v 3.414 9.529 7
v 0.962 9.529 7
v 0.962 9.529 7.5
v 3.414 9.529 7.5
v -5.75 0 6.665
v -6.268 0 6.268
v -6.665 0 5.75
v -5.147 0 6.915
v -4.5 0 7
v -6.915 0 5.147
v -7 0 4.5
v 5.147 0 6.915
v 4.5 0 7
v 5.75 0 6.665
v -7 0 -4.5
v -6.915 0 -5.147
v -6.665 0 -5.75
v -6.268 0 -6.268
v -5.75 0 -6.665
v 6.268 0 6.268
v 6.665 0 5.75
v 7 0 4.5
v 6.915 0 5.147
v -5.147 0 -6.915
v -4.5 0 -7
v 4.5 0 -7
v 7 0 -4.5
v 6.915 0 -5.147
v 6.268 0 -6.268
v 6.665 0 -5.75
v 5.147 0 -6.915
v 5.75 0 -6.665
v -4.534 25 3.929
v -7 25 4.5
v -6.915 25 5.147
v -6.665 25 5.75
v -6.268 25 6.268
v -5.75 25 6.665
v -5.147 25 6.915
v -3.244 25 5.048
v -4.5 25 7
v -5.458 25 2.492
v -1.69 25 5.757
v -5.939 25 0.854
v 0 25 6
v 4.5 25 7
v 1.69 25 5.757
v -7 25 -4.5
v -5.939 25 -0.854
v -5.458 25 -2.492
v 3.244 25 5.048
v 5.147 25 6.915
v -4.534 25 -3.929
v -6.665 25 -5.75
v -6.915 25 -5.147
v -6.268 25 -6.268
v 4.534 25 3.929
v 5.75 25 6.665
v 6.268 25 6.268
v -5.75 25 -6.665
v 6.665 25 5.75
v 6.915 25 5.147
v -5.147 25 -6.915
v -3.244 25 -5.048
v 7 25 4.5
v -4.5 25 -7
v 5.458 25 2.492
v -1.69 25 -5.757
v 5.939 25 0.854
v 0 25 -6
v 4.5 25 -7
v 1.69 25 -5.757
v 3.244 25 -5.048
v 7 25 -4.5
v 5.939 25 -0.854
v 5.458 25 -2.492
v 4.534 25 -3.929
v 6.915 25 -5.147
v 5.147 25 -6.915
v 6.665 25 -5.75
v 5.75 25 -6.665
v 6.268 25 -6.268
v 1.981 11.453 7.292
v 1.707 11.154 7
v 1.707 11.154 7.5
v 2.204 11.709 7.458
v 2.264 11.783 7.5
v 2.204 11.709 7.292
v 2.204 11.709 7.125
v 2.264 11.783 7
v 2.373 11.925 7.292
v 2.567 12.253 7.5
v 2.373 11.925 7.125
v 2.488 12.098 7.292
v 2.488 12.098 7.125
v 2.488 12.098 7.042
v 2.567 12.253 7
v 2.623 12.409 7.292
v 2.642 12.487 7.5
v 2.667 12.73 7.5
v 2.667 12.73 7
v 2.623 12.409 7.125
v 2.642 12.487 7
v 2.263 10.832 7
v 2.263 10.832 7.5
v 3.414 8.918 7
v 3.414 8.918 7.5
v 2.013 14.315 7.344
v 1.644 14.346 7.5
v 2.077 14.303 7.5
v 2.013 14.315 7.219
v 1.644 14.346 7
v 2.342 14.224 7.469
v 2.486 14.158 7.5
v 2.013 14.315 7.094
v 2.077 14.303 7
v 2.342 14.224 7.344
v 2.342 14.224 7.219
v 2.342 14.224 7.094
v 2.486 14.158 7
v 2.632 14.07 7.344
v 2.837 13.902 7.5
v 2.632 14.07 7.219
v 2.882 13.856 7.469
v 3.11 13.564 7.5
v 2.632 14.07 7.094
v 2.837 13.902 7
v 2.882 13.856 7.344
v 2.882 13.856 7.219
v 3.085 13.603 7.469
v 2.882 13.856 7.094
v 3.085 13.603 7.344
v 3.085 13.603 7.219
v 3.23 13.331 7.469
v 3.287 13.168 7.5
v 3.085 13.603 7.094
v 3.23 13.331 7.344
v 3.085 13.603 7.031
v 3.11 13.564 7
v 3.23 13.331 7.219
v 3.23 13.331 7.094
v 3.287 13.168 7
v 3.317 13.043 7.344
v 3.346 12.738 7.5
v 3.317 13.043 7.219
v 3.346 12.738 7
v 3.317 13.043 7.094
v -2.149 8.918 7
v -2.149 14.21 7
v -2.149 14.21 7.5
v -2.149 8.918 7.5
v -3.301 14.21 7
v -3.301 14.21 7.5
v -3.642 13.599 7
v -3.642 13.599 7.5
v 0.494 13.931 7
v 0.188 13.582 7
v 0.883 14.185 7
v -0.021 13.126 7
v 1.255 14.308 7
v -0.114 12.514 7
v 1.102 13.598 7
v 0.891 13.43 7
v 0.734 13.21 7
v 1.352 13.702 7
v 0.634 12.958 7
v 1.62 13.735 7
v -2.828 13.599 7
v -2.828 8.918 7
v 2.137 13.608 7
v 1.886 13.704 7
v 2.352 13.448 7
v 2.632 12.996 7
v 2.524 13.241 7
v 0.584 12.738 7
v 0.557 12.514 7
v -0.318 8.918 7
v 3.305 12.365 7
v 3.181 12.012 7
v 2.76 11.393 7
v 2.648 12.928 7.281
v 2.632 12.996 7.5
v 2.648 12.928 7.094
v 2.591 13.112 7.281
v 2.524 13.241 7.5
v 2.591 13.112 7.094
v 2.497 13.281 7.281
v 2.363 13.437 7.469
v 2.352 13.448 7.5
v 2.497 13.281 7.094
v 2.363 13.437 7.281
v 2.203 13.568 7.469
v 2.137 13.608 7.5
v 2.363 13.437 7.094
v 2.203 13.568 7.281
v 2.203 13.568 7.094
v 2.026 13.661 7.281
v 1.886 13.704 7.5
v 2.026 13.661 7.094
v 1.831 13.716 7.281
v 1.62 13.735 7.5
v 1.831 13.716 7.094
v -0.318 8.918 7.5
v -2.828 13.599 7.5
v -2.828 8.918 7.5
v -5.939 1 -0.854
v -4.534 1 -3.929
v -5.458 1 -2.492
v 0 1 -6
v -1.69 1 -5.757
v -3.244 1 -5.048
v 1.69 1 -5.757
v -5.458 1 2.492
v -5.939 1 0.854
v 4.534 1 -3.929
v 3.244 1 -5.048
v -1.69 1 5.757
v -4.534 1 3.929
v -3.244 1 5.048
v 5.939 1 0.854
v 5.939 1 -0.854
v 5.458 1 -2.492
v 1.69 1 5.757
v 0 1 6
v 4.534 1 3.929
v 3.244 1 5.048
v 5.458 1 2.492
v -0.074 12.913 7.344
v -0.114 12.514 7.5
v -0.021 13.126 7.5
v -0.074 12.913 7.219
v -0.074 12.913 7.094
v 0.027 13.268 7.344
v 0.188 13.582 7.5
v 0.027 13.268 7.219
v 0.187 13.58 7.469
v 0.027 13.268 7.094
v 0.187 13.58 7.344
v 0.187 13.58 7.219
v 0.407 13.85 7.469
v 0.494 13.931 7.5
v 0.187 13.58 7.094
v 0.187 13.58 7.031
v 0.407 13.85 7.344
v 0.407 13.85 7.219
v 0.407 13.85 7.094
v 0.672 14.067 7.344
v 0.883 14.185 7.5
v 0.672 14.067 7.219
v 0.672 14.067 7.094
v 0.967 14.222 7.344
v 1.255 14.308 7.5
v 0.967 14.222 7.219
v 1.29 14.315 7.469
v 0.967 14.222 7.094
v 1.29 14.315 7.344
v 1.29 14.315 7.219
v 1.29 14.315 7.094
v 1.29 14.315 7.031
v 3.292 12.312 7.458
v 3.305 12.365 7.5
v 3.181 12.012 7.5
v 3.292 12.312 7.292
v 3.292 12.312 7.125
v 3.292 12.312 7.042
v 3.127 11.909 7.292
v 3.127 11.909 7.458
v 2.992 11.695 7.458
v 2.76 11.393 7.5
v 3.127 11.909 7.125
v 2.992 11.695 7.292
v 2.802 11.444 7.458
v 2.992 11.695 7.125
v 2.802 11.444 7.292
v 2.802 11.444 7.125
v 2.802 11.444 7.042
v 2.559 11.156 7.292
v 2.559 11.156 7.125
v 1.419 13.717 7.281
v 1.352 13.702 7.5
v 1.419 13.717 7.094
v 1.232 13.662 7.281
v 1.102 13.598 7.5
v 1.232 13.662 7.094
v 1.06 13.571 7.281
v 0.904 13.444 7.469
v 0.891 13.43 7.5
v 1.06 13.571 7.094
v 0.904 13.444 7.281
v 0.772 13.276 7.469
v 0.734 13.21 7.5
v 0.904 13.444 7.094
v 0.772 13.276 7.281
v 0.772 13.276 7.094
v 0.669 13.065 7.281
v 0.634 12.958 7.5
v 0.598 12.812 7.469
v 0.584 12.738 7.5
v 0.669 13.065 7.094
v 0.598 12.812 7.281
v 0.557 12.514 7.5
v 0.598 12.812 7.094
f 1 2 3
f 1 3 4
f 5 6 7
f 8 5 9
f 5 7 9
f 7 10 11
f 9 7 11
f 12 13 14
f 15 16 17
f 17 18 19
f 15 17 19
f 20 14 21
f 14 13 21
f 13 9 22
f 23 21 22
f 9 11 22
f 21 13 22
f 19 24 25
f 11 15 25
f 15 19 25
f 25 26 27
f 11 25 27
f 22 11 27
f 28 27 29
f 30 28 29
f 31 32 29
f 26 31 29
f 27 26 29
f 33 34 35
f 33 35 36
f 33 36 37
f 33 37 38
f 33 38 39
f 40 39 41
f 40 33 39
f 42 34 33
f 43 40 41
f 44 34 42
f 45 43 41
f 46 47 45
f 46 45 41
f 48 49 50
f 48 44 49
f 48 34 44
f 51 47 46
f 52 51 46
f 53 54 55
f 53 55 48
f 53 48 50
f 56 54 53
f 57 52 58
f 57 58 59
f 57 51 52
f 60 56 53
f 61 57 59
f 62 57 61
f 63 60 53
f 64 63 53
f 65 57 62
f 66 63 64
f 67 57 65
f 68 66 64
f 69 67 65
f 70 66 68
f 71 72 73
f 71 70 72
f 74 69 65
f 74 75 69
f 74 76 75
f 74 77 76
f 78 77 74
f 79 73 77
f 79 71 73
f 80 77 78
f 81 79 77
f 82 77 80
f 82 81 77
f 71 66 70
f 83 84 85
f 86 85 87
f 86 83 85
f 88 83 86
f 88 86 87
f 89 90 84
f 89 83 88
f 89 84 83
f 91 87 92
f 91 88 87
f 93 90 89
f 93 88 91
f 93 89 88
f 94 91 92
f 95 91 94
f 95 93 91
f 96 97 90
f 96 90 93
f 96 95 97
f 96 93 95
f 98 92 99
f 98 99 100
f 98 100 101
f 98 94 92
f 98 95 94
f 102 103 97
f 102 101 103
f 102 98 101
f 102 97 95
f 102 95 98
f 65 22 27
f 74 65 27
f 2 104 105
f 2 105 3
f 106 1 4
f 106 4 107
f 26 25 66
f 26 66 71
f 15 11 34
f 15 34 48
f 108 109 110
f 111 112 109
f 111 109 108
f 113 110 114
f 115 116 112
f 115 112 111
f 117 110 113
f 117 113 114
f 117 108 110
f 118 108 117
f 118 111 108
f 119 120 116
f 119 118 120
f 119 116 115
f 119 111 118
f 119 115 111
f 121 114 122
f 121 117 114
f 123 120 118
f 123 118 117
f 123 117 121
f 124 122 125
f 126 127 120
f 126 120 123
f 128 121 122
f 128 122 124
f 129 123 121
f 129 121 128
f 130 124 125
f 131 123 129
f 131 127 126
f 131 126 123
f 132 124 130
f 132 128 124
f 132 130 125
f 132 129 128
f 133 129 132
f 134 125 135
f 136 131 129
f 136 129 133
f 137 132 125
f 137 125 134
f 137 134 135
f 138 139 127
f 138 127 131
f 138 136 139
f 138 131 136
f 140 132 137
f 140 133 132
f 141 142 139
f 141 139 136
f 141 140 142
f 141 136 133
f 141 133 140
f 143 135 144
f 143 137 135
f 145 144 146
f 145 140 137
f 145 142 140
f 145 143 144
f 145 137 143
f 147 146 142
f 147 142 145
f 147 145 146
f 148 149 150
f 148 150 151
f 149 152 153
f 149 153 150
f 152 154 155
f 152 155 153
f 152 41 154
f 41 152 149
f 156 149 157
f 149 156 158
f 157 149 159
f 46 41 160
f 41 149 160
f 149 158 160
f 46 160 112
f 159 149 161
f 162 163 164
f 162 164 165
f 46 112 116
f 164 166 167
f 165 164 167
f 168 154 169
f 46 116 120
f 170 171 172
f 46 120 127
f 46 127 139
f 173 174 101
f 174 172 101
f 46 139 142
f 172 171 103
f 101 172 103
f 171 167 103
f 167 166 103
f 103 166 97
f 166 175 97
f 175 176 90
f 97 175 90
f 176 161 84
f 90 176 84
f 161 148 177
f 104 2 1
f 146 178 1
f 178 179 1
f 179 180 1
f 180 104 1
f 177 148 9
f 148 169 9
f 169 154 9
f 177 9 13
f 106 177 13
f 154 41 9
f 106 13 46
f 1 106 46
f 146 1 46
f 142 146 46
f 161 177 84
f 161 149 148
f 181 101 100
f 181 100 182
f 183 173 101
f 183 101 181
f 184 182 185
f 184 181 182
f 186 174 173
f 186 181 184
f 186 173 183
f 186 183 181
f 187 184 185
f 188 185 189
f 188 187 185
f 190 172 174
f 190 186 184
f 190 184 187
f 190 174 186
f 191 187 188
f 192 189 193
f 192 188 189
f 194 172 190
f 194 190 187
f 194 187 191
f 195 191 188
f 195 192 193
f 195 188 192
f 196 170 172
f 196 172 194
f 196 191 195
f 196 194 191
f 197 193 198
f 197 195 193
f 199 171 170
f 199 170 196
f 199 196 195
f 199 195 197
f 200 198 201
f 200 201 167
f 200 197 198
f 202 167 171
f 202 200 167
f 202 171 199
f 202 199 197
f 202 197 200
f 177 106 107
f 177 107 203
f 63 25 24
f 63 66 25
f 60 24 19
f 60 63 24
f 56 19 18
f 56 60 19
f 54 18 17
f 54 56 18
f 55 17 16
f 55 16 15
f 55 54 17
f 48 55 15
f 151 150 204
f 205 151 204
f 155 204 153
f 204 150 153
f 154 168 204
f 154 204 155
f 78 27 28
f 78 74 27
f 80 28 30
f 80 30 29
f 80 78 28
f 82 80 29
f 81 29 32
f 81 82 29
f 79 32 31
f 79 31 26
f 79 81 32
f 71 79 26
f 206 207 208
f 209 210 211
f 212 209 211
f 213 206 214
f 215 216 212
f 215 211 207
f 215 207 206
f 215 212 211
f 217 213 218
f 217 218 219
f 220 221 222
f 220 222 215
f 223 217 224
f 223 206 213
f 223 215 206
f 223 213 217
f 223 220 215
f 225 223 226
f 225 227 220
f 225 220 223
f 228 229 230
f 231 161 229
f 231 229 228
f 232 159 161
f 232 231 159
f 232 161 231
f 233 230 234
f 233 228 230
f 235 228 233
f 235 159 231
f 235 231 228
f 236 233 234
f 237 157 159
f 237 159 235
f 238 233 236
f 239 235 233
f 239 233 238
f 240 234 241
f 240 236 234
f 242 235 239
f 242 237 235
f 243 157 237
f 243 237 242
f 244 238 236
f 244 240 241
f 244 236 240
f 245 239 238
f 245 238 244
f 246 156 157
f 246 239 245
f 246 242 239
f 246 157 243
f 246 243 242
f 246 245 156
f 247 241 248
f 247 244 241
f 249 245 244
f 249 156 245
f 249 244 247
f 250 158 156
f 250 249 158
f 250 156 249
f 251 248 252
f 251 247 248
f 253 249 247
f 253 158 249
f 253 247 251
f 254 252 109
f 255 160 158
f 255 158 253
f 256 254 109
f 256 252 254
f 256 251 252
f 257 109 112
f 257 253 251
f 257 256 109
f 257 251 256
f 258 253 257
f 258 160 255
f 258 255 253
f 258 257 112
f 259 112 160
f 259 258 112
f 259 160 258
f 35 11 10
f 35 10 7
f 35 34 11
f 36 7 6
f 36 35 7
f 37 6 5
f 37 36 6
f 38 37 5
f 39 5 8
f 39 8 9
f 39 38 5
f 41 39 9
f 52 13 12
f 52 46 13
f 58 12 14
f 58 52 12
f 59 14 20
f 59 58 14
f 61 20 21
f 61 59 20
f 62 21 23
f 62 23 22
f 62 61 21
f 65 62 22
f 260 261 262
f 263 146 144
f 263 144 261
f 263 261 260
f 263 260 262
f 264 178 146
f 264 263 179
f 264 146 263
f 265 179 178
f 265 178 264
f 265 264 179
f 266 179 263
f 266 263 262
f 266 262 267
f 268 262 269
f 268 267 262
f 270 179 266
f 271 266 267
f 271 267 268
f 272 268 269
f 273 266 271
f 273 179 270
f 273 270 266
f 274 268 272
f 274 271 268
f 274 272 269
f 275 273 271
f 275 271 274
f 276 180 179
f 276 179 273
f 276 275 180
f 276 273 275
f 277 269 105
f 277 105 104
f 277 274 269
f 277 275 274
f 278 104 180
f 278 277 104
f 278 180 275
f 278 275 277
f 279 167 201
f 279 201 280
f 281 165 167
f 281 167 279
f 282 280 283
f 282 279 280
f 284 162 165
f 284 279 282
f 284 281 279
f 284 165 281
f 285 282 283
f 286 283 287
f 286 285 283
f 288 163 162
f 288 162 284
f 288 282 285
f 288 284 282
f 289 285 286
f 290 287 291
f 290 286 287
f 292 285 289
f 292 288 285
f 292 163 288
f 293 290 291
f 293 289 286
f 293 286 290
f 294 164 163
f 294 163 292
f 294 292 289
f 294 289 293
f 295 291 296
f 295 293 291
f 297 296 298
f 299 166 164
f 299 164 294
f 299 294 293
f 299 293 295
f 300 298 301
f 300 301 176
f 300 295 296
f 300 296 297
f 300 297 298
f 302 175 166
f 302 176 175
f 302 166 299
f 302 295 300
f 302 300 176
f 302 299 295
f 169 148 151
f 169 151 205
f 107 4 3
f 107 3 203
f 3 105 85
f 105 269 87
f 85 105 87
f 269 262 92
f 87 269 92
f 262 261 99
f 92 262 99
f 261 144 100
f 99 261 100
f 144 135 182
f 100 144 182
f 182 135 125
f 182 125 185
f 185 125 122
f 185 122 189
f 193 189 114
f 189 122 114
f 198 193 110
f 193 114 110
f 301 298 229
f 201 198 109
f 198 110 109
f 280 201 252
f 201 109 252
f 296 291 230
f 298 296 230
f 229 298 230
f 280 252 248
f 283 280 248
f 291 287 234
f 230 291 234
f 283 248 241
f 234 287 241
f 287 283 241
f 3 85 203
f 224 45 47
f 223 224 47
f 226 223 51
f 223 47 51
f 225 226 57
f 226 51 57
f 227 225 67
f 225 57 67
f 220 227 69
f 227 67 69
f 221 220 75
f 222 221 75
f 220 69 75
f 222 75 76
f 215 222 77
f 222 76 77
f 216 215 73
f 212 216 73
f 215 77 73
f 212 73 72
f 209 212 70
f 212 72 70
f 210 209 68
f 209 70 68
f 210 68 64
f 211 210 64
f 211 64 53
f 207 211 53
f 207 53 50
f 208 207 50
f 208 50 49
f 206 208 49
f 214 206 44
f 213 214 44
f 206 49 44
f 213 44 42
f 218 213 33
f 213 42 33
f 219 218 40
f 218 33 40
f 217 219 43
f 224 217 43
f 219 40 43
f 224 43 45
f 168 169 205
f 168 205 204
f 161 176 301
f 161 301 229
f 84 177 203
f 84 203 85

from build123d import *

# Parameters (mm, degrees)
SKETCH1_W           = 14
SKETCH1_H           = 14
BOSS_EXTRUDE1_DEPTH = 25
SKETCH2_R           = 6
CUT_EXTRUDE1_DEPTH  = 24
BOSS_EXTRUDE3_DEPTH = 0.5
FILLET1_R           = 2.5
FILLET2_R           = 2.5
FILLET3_R           = 2.5
FILLET4_R           = 2.5


with BuildPart() as part:
    # Sketch1 → Boss-Extrude1 (new body)
    with BuildSketch(Plane(origin=(0, 0, 0), x_dir=(1, 0, 0), z_dir=(0, 1, 0))):
        Rectangle(SKETCH1_W, SKETCH1_H)
    extrude(amount=BOSS_EXTRUDE1_DEPTH)

    # Sketch2 → Cut-Extrude1 (cut)
    with BuildSketch(Plane(origin=(0, 25, 0), x_dir=(1, 0, 0), z_dir=(0, 1, 0))):
        with Locations(Location((0, 0, 0), (0, 0, 270))):
            Circle(SKETCH2_R)
    extrude(amount=-CUT_EXTRUDE1_DEPTH, mode=Mode.SUBTRACT)

    # Sketch3 → Boss-Extrude3 (add)
    with BuildSketch(Plane.XY.offset(7)):
        Polygon((-3.300679086, 14.210073329), (-2.149487179, 14.210073329), (-2.149487179, 8.918406662), (-2.827905982, 8.918406662), (-2.827905982, 13.599496406), (-3.642008546, 13.599496406), align=None)
        with BuildLine():
            Line((0.556767829, 12.514026321), (-0.114230768, 12.514026321))
            add(Edge.make_bspline(
                [(-0.114230768, 12.514026321), (-0.111078886, 12.582304036), (-0.104914236, 12.71584588), (-0.077540014, 12.910431266), (-0.033195725, 13.093780337), (0.02277613, 13.267447402), (0.097441024, 13.429261532), (0.183589376, 13.582043561), (0.287590231, 13.722591478), (0.405116879, 13.851127618), (0.532696206, 13.967907704), (0.66984458, 14.068604955), (0.814243771, 14.154413881), (0.965922174, 14.224434532), (1.125176835, 14.278650186), (1.291553818, 14.318101559), (1.465583884, 14.341830622), (1.584215771, 14.344436169), (1.644357974, 14.34575709)],
                knots=[0, 0, 0, 0, 1.154964179, 2.258951466, 3.315045469, 4.34063582, 5.337653555, 6.322213479, 7.300594401, 8.285733883, 9.262436119, 10.219305053, 11.156568068, 12.097250375, 13.037875795, 13.995471444, 14.983774372, 16, 16, 16, 16], degree=3))
            add(Edge.make_bspline(
                [(1.644357974, 14.34575709), (1.70732699, 14.344469016), (1.830889612, 14.34194146), (2.01082655, 14.31815685), (2.181120391, 14.279804182), (2.341820997, 14.227428226), (2.492635583, 14.157492683), (2.633861547, 14.073158132), (2.764141354, 13.971791047), (2.884420569, 13.858367608), (2.990658217, 13.73360089), (3.086612633, 13.605325884), (3.165928247, 13.470941026), (3.232374739, 13.332900213), (3.283506362, 13.190070488), (3.319615354, 13.043033103), (3.341259687, 12.891688146), (3.344213908, 12.789350264), (3.345705129, 12.73769252)],
                knots=[0, 0, 0, 0, 1.156722346, 2.269809107, 3.328396062, 4.361258308, 5.3694338, 6.377253737, 7.377324894, 8.397019439, 9.4098266, 10.385180797, 11.337325354, 12.27255833, 13.196816462, 14.119704983, 15.050871513, 16, 16, 16, 16], degree=3))
            add(Edge.make_bspline(
                [(3.345705129, 12.73769252), (3.342991558, 12.665431813), (3.337601589, 12.521900312), (3.29609716, 12.309553694), (3.226323351, 12.104046507), (3.145727927, 11.936709759), (3.064215379, 11.80144908), (2.989411872, 11.689803537), (2.901537104, 11.569080813), (2.798706557, 11.440089036), (2.685009192, 11.299876822), (2.555928501, 11.152061213), (2.415459729, 10.993649578), (2.315279585, 10.886982507), (2.263415132, 10.831759694)],
                knots=[0, 0, 0, 0, 1.155755081, 2.295677249, 3.447123235, 4.6205014, 5.259503175, 5.973005395, 6.77029923, 7.648035671, 8.612336498, 9.658570495, 10.787814065, 12, 12, 12, 12], degree=3))
            Line((2.263415132, 10.831759694), (0.961699053, 9.528983586))
            Line((0.961699053, 9.528983586), (3.413547009, 9.528983586))
            Line((3.413547009, 9.528983586), (3.413547009, 8.918406662))
            Line((3.413547009, 8.918406662), (-0.317756409, 8.918406662))
            Line((-0.317756409, 8.918406662), (1.706899707, 11.154008626))
            add(Edge.make_bspline(
                [(1.706899707, 11.154008626), (1.755124332, 11.205439648), (1.847668268, 11.304136719), (1.978095845, 11.448613384), (2.095770717, 11.582179805), (2.201320257, 11.704739563), (2.29198055, 11.81793999), (2.370190541, 11.92011571), (2.435064878, 12.011749217), (2.502437185, 12.119609483), (2.569196231, 12.248904612), (2.625986943, 12.406626513), (2.660064153, 12.567694788), (2.664877757, 12.676053287), (2.667286326, 12.730272314)],
                knots=[0, 0, 0, 0, 1.341560447, 2.574479018, 3.703506985, 4.728875774, 5.651874962, 6.462761537, 7.177175968, 7.787249671, 8.88179658, 9.938774664, 10.968630673, 12, 12, 12, 12], degree=3))
            add(Edge.make_bspline(
                [(2.667286326, 12.730272314), (2.666692753, 12.763907746), (2.66551825, 12.830462259), (2.649505827, 12.927923363), (2.626949455, 13.022455211), (2.592062636, 13.112538015), (2.550030438, 13.199944057), (2.497455636, 13.283543423), (2.434322648, 13.362560638), (2.36409314, 13.43877354), (2.286417458, 13.507585159), (2.204373375, 13.569299116), (2.116951948, 13.619418877), (2.026543408, 13.663249485), (1.930337353, 13.694322519), (1.830698643, 13.717457991), (1.726844914, 13.733484398), (1.656080047, 13.734607291), (1.619977298, 13.735180167)],
                knots=[0, 0, 0, 0, 0.999432927, 1.977580462, 2.931018689, 3.885672852, 4.844657058, 5.812871023, 6.815890212, 7.849665183, 8.891901864, 9.898878619, 10.897592748, 11.885014695, 12.882178885, 13.896915602, 14.927050508, 16, 16, 16, 16], degree=3))
            add(Edge.make_bspline(
                [(1.619977298, 13.735180167), (1.585654597, 13.734476202), (1.518132832, 13.733091317), (1.41869032, 13.718802518), (1.32323782, 13.695537542), (1.23145333, 13.663266899), (1.14267207, 13.623454267), (1.059064891, 13.571877079), (0.979265259, 13.511876917), (0.902218203, 13.444535768), (0.832096498, 13.365531193), (0.76937784, 13.275799414), (0.71399479, 13.175242657), (0.666655887, 13.064036834), (0.627423824, 12.941890194), (0.595952005, 12.808951264), (0.571621246, 12.66516219), (0.561810561, 12.565336908), (0.556767829, 12.514026321)],
                knots=[0, 0, 0, 0, 0.911540883, 1.79324023, 2.663162255, 3.518366492, 4.375475705, 5.243419306, 6.122264358, 7.02676621, 7.957780629, 8.921596253, 9.930241338, 11.002848587, 12.128200329, 13.335197372, 14.630280975, 16, 16, 16, 16], degree=3))
        make_face()
    extrude(amount=BOSS_EXTRUDE3_DEPTH)

    # Fillet1
    fillet1_edges = [part.edges().sort_by_distance(p)[0] for p in [
        (-7, 12.5, 7),
    ]]
    fillet(fillet1_edges, radius=FILLET1_R)

    # Fillet2
    fillet2_edges = [part.edges().sort_by_distance(p)[0] for p in [
        (7, 12.5, 7),
    ]]
    fillet(fillet2_edges, radius=FILLET2_R)

    # Fillet3
    fillet3_edges = [part.edges().sort_by_distance(p)[0] for p in [
        (7, 12.5, -7),
    ]]
    fillet(fillet3_edges, radius=FILLET3_R)

    # Fillet4
    fillet4_edges = [part.edges().sort_by_distance(p)[0] for p in [
        (-7, 12.5, -7),
    ]]
    fillet(fillet4_edges, radius=FILLET4_R)


solid = part.part
